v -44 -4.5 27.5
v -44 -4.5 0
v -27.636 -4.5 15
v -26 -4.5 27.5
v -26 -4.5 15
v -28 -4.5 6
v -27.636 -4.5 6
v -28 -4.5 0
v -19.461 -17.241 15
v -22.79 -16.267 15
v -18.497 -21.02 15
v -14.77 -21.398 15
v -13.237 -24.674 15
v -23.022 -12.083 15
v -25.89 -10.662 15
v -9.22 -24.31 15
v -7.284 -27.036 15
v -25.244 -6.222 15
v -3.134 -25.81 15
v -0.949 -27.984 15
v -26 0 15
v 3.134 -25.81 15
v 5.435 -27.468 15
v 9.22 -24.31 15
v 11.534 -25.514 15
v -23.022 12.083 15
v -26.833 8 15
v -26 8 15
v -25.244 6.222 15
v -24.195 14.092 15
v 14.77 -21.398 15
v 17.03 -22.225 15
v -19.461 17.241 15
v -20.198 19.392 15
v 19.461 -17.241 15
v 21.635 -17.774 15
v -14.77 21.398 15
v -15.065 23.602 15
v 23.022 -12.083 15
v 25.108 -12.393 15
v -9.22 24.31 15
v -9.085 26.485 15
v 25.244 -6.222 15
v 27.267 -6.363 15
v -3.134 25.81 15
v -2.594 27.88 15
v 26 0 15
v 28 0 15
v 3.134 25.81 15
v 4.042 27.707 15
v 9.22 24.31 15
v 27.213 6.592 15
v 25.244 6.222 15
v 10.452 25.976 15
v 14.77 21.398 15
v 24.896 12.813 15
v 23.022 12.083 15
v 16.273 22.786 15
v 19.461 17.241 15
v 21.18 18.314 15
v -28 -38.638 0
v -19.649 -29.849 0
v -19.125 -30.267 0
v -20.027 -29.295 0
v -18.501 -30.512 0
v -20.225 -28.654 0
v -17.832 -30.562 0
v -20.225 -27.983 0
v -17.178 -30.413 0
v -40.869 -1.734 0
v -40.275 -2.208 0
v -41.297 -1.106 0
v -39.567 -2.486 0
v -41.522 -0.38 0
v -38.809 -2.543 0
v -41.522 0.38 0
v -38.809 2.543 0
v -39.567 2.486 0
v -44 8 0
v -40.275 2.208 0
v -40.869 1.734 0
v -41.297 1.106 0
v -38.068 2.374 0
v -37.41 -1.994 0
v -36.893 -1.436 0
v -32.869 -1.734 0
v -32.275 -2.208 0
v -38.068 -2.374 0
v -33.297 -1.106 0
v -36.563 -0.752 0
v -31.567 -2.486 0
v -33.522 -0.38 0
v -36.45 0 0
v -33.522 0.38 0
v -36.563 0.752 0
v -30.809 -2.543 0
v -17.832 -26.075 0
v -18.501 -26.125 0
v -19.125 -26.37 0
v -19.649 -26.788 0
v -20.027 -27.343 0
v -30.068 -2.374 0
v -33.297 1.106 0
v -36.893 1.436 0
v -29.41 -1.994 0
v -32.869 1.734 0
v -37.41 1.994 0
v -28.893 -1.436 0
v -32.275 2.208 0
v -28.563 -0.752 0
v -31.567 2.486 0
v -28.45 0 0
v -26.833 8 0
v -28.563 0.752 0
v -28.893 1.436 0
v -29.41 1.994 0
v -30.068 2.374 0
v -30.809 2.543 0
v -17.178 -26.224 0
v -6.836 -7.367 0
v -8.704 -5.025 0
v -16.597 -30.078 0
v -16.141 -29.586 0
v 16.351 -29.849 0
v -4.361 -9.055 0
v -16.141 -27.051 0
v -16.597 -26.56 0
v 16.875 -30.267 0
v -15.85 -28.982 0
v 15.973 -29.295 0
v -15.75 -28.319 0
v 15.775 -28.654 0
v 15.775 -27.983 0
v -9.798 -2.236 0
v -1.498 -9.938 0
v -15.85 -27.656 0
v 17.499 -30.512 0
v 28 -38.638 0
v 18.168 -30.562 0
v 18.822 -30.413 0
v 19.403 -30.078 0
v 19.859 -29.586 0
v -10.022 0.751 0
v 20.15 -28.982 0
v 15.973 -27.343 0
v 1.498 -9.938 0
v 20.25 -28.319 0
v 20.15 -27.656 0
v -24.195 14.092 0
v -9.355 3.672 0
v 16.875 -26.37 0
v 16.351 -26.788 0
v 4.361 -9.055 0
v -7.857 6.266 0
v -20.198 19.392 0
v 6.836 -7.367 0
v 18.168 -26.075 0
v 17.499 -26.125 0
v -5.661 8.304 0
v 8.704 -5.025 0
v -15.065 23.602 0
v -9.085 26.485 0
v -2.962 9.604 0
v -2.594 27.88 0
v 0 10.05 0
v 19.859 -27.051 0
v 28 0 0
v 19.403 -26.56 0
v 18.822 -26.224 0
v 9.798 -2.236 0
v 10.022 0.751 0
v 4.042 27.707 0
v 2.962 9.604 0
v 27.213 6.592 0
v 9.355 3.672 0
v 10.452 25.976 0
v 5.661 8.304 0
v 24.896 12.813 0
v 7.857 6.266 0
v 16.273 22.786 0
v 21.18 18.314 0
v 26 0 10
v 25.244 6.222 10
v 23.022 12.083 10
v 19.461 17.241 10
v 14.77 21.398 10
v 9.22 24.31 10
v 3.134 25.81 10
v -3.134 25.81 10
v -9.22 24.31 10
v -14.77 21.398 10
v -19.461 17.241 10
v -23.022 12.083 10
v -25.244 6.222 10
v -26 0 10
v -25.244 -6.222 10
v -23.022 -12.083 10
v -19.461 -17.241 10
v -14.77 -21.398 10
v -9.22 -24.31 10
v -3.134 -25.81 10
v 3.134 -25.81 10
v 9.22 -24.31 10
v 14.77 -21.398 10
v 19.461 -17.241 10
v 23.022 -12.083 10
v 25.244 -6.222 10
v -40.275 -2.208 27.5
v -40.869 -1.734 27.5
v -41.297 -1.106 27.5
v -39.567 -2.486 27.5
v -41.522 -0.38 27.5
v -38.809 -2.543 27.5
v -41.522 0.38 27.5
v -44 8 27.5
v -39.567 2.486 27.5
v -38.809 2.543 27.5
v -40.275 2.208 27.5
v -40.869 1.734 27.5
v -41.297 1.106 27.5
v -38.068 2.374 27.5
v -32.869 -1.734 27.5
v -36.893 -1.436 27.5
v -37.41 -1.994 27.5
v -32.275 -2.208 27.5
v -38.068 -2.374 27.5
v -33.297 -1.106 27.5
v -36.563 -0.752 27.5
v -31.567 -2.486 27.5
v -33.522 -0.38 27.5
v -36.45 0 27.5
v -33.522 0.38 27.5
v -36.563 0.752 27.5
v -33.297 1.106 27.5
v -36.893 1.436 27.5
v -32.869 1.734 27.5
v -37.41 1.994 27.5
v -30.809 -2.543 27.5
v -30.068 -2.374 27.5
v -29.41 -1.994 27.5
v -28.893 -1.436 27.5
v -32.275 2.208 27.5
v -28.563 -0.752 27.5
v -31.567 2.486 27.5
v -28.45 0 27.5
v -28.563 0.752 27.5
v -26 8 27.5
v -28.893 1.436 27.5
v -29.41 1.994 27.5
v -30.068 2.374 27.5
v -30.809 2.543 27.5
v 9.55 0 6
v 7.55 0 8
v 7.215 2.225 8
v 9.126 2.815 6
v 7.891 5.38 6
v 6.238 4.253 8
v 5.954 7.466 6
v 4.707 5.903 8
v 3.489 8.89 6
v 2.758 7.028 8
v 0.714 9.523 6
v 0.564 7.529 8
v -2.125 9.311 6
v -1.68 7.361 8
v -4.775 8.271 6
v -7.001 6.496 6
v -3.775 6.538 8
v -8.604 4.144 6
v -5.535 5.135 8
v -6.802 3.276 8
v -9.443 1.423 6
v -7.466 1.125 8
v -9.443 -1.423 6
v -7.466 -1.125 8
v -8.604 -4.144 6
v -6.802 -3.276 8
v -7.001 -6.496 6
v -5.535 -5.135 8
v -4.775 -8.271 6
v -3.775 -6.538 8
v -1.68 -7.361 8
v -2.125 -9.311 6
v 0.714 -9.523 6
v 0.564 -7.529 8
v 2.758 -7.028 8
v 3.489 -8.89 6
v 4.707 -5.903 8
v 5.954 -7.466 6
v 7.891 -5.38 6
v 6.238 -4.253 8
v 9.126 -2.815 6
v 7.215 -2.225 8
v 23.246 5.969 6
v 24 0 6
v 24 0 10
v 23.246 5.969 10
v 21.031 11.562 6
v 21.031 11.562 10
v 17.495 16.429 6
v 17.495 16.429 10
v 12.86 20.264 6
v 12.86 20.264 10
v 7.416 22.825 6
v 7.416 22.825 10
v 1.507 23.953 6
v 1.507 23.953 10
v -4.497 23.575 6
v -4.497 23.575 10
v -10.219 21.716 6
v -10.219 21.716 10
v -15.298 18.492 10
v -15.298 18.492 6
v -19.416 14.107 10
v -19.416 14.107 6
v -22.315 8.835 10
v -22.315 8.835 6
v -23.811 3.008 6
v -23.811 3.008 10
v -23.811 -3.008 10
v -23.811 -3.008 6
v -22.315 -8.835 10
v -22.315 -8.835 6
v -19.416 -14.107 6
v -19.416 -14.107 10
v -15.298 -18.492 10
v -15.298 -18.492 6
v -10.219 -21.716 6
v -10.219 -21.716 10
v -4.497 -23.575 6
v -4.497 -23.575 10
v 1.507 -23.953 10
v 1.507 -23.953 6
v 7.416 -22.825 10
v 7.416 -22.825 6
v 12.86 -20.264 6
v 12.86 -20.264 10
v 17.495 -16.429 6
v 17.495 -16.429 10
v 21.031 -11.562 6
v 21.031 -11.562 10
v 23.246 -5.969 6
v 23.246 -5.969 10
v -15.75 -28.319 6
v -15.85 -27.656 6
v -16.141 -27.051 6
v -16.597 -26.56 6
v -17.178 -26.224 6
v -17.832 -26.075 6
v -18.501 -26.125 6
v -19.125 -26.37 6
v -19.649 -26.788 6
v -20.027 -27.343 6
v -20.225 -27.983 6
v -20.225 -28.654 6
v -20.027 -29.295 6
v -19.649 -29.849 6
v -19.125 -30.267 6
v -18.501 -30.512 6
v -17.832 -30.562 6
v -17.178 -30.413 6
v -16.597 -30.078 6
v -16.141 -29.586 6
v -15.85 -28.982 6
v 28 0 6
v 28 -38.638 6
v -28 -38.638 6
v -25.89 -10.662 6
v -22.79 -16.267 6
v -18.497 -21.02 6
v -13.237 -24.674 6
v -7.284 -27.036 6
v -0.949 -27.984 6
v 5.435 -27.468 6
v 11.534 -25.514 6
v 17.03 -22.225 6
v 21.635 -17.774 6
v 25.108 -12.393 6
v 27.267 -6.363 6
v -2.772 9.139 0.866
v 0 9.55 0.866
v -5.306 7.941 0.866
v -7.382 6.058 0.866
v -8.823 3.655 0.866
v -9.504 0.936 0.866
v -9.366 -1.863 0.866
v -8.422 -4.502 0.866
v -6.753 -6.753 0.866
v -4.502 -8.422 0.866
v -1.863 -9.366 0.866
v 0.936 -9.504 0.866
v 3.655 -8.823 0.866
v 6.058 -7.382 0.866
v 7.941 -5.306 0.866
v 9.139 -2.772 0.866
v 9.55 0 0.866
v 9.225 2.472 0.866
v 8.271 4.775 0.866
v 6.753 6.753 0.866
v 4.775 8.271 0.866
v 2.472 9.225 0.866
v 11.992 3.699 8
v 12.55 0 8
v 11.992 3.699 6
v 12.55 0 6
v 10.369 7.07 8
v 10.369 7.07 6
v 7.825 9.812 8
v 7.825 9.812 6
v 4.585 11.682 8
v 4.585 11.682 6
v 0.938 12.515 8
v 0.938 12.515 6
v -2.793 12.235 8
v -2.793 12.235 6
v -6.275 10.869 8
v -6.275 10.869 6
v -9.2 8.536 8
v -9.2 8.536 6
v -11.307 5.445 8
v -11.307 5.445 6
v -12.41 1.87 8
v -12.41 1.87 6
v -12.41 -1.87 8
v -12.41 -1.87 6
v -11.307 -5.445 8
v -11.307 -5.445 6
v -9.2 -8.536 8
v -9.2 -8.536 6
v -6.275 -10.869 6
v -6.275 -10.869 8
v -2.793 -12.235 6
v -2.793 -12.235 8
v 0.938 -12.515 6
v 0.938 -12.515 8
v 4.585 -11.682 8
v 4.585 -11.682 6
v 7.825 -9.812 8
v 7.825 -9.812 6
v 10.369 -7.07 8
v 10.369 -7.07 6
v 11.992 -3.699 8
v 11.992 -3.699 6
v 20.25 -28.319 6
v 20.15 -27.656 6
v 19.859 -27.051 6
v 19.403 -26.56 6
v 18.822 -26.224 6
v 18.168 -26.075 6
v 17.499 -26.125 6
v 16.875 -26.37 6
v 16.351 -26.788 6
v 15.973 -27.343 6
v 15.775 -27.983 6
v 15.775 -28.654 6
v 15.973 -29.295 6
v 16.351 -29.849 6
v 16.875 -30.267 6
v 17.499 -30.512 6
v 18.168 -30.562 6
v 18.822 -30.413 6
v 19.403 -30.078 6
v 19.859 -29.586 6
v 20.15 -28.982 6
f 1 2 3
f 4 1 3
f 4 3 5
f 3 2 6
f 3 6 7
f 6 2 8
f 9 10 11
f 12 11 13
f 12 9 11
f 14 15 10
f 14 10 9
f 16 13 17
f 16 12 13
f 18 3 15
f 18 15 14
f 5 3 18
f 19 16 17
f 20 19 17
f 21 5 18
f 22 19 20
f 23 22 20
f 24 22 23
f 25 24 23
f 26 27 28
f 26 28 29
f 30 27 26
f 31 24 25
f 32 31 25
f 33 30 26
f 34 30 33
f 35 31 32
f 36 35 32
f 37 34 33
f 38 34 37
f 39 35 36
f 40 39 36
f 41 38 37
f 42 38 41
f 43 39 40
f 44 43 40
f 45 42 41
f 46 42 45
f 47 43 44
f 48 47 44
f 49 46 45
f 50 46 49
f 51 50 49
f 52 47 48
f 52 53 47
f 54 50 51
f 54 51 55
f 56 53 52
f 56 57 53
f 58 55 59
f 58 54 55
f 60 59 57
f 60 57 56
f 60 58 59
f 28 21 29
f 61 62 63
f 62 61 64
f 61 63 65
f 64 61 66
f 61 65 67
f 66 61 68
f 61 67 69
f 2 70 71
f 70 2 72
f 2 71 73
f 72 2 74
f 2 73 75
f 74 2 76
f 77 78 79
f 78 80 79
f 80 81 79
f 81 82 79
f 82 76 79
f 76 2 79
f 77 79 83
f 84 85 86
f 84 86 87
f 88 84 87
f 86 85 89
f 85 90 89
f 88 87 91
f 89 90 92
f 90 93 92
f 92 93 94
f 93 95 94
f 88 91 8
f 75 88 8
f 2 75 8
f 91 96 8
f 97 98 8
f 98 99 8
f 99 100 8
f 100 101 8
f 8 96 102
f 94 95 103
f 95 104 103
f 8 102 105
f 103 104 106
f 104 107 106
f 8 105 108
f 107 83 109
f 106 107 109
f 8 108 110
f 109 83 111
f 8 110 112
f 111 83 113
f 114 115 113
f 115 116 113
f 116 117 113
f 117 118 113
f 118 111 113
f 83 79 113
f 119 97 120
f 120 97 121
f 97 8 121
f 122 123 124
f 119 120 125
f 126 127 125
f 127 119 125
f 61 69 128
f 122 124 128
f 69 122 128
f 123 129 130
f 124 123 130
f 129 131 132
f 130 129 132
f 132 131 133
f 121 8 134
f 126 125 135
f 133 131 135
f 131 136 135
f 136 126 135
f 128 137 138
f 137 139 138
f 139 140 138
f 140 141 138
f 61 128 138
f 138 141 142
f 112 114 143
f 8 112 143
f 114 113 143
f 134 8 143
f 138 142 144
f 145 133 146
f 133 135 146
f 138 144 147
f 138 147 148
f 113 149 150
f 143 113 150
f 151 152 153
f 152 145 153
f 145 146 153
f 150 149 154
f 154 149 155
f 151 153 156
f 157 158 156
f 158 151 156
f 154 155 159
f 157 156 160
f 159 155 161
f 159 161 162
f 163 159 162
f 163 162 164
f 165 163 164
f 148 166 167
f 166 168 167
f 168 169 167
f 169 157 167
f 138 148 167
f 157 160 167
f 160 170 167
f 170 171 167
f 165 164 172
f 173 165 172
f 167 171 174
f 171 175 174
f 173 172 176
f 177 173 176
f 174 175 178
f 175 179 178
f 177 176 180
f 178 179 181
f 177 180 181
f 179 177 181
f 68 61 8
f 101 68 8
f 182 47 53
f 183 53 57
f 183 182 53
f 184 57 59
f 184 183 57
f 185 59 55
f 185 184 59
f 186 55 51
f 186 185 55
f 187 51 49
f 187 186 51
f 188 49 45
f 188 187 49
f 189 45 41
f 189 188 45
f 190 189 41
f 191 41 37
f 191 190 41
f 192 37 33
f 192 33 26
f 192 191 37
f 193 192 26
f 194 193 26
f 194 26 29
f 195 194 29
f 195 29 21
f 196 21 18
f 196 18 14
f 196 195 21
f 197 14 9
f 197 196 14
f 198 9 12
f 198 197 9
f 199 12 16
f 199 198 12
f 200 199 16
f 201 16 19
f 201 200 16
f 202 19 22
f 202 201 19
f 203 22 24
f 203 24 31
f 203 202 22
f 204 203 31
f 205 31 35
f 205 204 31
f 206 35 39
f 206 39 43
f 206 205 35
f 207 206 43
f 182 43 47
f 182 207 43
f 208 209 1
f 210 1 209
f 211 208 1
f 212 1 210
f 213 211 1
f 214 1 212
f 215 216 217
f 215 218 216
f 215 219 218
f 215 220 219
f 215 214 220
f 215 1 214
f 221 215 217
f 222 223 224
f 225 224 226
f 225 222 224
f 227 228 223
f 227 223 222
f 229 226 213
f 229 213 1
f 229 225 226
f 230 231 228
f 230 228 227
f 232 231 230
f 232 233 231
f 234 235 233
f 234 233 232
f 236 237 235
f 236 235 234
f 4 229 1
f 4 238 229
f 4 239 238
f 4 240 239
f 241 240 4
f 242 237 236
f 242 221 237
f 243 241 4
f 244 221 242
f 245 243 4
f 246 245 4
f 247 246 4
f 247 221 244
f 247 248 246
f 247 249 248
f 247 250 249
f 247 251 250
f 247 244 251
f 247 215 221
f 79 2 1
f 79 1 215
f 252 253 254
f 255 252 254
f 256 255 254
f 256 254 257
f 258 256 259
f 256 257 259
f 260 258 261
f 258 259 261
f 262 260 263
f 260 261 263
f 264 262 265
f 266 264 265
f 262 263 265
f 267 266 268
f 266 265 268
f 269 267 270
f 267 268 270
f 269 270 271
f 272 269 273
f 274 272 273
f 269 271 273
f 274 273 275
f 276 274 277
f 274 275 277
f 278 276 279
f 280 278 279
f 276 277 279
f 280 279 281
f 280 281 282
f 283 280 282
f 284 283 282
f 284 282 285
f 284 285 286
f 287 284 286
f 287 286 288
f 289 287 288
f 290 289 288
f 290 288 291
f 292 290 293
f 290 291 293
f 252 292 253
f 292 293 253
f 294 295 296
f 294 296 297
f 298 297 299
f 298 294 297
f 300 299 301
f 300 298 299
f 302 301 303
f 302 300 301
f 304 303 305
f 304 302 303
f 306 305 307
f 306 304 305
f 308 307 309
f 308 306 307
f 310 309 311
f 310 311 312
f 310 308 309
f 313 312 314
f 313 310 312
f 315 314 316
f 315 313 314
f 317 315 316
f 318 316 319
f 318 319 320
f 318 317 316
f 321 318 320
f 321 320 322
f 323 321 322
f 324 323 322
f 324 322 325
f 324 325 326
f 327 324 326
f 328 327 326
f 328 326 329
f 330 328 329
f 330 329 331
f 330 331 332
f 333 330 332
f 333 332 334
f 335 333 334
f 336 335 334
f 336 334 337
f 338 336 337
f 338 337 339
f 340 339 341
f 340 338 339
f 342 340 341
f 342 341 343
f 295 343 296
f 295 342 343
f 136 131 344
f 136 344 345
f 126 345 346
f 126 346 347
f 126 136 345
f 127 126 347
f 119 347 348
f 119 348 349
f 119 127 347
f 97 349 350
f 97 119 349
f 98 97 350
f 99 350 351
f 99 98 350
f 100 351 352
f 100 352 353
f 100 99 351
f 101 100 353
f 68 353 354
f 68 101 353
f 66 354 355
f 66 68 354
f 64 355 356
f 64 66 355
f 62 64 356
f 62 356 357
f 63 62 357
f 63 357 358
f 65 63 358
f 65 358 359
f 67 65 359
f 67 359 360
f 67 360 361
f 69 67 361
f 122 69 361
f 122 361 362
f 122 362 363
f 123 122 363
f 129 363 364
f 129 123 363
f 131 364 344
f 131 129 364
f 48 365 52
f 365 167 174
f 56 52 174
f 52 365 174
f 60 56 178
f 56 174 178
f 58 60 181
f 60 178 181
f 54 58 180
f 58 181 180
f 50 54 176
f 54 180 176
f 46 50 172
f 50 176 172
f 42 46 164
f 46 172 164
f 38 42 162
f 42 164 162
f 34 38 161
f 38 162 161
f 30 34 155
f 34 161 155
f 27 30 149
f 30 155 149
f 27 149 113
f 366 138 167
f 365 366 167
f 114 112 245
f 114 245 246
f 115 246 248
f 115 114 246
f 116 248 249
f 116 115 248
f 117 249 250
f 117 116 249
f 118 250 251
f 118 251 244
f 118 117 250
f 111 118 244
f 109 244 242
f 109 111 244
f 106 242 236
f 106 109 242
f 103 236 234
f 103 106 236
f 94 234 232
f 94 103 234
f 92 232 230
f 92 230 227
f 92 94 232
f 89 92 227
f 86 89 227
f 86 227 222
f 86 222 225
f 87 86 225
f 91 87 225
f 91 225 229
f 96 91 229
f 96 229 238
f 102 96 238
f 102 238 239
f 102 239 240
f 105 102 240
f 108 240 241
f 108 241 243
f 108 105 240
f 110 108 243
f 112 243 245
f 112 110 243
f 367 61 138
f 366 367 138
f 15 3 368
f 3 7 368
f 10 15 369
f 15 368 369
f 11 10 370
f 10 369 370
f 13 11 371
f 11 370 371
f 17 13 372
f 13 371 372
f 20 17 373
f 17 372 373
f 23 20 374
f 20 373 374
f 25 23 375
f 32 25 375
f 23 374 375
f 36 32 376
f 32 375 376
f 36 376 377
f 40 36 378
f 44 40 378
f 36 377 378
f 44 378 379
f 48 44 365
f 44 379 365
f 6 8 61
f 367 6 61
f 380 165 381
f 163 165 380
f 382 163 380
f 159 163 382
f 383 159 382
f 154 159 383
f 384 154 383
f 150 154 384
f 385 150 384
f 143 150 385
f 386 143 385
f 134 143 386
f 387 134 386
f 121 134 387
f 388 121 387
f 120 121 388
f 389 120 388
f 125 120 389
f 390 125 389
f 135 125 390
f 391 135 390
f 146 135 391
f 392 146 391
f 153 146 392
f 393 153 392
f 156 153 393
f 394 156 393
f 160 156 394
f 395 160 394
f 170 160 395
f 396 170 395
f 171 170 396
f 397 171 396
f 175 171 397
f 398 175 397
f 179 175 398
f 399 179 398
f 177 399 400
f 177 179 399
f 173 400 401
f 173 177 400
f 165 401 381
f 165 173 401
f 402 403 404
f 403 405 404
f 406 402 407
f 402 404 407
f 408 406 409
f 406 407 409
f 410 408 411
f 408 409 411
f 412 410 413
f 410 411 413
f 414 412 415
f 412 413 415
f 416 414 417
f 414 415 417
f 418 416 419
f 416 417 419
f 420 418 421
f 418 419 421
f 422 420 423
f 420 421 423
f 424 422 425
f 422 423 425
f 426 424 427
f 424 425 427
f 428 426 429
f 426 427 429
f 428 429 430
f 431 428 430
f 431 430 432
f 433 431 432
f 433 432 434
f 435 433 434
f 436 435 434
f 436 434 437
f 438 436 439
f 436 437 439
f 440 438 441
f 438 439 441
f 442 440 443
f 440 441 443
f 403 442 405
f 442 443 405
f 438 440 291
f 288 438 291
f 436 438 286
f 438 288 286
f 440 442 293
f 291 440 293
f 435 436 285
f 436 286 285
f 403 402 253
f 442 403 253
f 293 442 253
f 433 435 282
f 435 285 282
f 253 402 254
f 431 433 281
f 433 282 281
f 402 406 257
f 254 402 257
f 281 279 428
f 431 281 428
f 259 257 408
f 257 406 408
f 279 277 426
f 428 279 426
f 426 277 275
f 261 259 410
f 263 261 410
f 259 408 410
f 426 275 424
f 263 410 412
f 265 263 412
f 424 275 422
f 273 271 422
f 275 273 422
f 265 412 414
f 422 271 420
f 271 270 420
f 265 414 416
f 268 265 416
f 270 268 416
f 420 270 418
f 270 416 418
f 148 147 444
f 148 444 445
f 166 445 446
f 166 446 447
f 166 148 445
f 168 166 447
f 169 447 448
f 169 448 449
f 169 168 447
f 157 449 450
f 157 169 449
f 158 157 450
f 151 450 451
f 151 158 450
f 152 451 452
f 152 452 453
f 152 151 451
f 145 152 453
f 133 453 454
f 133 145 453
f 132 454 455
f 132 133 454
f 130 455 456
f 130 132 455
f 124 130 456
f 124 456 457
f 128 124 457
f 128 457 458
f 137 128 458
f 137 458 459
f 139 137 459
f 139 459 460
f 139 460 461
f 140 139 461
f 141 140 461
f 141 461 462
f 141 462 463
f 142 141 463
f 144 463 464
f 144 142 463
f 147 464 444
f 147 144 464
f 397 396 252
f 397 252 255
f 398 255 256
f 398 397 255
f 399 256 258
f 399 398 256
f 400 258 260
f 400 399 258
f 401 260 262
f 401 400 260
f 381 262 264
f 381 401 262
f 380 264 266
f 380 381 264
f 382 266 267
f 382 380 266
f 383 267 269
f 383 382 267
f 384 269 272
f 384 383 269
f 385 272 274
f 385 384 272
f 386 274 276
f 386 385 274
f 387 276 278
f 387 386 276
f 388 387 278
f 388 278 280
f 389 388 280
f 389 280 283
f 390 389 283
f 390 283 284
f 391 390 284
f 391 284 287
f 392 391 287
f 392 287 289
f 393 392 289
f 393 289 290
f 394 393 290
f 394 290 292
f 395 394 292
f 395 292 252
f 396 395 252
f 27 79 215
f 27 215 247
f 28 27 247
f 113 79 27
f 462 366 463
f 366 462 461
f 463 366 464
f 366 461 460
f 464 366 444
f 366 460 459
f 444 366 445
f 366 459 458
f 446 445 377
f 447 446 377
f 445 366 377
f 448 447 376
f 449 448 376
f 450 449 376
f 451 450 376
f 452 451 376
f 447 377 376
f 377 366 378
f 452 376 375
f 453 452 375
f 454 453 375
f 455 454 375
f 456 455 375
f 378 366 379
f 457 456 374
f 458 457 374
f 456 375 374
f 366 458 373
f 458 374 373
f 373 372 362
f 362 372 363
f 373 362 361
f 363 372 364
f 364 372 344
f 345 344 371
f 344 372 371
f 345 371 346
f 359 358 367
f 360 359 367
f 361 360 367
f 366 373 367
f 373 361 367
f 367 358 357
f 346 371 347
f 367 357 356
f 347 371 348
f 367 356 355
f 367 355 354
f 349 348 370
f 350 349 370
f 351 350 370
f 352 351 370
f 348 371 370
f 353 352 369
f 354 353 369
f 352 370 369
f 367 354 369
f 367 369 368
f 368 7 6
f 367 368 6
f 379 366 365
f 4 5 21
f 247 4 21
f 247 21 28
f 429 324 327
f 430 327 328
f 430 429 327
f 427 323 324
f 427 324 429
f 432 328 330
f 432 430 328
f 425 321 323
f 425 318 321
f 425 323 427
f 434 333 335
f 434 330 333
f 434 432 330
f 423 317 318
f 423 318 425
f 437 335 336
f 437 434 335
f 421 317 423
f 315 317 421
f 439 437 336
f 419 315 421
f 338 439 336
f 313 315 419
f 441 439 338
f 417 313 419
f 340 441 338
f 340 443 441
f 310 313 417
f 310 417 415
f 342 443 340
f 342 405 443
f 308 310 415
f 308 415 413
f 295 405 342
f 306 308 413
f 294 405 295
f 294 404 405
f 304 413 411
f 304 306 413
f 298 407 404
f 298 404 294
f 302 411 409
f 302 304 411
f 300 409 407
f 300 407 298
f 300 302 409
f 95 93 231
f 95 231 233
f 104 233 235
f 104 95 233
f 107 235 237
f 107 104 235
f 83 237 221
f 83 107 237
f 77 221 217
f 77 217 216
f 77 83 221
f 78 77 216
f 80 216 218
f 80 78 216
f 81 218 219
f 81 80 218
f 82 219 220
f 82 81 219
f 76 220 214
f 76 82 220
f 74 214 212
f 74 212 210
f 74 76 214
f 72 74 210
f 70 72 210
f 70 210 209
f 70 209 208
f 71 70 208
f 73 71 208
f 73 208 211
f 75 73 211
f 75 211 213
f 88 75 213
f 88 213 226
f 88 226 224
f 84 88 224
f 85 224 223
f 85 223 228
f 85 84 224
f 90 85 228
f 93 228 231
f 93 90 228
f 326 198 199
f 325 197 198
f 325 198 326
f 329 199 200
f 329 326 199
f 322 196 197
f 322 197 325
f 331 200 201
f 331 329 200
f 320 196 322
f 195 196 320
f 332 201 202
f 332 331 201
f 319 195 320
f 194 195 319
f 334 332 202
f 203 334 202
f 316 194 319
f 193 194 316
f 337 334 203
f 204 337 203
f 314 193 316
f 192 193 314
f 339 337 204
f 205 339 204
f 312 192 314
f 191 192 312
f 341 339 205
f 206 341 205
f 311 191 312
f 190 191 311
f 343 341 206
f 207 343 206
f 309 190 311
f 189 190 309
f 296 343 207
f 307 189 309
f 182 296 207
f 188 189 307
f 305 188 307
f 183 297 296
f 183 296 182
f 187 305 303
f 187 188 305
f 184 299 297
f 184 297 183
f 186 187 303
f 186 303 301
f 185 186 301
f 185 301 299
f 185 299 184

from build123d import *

# Parameters (mm, degrees)
SKETCH040_R   = 28
SKETCH040_R_2 = 9.55
PAD025_DEPTH  = 6
SKETCH038_R   = 28
SKETCH038_R_2 = 26
PAD023_DEPTH  = 15
SKETCH039_R   = 2.25
PAD024_DEPTH  = 6
SKETCH091_R   = 28
SKETCH091_R_2 = 24
PAD056_DEPTH  = 10
SKETCH098_W   = 18
SKETCH098_H   = 12.5
SKETCH098_R   = 2.55
PAD060_DEPTH  = 27.5


with BuildPart() as part:
    # Sketch040 → Pad025 (new body)
    with BuildSketch(Plane.XY):
        Circle(SKETCH040_R)
        Circle(SKETCH040_R_2, mode=Mode.SUBTRACT)
    extrude(amount=PAD025_DEPTH)

    # Sketch038 → Pad023 (join)
    with BuildSketch(Plane.XY):
        Circle(SKETCH038_R)
        Circle(SKETCH038_R_2, mode=Mode.SUBTRACT)
    extrude(amount=PAD023_DEPTH)

    # Sketch039 → Pad024 (join)
    with BuildSketch(Plane.XY):
        with BuildLine():
            ThreePointArc((-28, 0), (0, -28), (28, 0))
            Line((28, -38.6375), (28, 0))
            Line((-28, -38.6375), (28, -38.6375))
            Line((-28, 0), (-28, -38.6375))
        make_face()
        with Locations((-18, -28.31875)):
            Circle(SKETCH039_R, mode=Mode.SUBTRACT)
        with Locations((18, -28.31875)):
            Circle(SKETCH039_R, mode=Mode.SUBTRACT)
    extrude(amount=PAD024_DEPTH)

    # Sketch041 → Groove (revolve, cut)
    with BuildSketch(Plane.YZ):
        Polygon((9.55, 0.866025), (10.05, 0), (9.55, 0), align=None)
    revolve(axis=Axis((0, 0, 0), (0, 0, 1)), mode=Mode.SUBTRACT)

    # Sketch065 → Revolution (revolve)
    with BuildSketch(Plane.XZ):
        Polygon((9.55, 6), (7.55, 8), (12.55, 8), (12.55, 6), align=None)
    revolve(axis=Axis((0, 0, 0), (0, 0, 1)))

    # Sketch091 → Pad056 (join)
    with BuildSketch(Plane.XY):
        Circle(SKETCH091_R)
        Circle(SKETCH091_R_2, mode=Mode.SUBTRACT)
    extrude(amount=PAD056_DEPTH)

    # Sketch098 → Pad060 (join)
    with BuildSketch(Plane.XY):
        with Locations((-35, 1.75)):
            Rectangle(SKETCH098_W, SKETCH098_H)
        with Locations((-39, 0)):
            Circle(SKETCH098_R, mode=Mode.SUBTRACT)
        with Locations((-31, 0)):
            Circle(SKETCH098_R, mode=Mode.SUBTRACT)
    extrude(amount=PAD060_DEPTH)


solid = part.part
